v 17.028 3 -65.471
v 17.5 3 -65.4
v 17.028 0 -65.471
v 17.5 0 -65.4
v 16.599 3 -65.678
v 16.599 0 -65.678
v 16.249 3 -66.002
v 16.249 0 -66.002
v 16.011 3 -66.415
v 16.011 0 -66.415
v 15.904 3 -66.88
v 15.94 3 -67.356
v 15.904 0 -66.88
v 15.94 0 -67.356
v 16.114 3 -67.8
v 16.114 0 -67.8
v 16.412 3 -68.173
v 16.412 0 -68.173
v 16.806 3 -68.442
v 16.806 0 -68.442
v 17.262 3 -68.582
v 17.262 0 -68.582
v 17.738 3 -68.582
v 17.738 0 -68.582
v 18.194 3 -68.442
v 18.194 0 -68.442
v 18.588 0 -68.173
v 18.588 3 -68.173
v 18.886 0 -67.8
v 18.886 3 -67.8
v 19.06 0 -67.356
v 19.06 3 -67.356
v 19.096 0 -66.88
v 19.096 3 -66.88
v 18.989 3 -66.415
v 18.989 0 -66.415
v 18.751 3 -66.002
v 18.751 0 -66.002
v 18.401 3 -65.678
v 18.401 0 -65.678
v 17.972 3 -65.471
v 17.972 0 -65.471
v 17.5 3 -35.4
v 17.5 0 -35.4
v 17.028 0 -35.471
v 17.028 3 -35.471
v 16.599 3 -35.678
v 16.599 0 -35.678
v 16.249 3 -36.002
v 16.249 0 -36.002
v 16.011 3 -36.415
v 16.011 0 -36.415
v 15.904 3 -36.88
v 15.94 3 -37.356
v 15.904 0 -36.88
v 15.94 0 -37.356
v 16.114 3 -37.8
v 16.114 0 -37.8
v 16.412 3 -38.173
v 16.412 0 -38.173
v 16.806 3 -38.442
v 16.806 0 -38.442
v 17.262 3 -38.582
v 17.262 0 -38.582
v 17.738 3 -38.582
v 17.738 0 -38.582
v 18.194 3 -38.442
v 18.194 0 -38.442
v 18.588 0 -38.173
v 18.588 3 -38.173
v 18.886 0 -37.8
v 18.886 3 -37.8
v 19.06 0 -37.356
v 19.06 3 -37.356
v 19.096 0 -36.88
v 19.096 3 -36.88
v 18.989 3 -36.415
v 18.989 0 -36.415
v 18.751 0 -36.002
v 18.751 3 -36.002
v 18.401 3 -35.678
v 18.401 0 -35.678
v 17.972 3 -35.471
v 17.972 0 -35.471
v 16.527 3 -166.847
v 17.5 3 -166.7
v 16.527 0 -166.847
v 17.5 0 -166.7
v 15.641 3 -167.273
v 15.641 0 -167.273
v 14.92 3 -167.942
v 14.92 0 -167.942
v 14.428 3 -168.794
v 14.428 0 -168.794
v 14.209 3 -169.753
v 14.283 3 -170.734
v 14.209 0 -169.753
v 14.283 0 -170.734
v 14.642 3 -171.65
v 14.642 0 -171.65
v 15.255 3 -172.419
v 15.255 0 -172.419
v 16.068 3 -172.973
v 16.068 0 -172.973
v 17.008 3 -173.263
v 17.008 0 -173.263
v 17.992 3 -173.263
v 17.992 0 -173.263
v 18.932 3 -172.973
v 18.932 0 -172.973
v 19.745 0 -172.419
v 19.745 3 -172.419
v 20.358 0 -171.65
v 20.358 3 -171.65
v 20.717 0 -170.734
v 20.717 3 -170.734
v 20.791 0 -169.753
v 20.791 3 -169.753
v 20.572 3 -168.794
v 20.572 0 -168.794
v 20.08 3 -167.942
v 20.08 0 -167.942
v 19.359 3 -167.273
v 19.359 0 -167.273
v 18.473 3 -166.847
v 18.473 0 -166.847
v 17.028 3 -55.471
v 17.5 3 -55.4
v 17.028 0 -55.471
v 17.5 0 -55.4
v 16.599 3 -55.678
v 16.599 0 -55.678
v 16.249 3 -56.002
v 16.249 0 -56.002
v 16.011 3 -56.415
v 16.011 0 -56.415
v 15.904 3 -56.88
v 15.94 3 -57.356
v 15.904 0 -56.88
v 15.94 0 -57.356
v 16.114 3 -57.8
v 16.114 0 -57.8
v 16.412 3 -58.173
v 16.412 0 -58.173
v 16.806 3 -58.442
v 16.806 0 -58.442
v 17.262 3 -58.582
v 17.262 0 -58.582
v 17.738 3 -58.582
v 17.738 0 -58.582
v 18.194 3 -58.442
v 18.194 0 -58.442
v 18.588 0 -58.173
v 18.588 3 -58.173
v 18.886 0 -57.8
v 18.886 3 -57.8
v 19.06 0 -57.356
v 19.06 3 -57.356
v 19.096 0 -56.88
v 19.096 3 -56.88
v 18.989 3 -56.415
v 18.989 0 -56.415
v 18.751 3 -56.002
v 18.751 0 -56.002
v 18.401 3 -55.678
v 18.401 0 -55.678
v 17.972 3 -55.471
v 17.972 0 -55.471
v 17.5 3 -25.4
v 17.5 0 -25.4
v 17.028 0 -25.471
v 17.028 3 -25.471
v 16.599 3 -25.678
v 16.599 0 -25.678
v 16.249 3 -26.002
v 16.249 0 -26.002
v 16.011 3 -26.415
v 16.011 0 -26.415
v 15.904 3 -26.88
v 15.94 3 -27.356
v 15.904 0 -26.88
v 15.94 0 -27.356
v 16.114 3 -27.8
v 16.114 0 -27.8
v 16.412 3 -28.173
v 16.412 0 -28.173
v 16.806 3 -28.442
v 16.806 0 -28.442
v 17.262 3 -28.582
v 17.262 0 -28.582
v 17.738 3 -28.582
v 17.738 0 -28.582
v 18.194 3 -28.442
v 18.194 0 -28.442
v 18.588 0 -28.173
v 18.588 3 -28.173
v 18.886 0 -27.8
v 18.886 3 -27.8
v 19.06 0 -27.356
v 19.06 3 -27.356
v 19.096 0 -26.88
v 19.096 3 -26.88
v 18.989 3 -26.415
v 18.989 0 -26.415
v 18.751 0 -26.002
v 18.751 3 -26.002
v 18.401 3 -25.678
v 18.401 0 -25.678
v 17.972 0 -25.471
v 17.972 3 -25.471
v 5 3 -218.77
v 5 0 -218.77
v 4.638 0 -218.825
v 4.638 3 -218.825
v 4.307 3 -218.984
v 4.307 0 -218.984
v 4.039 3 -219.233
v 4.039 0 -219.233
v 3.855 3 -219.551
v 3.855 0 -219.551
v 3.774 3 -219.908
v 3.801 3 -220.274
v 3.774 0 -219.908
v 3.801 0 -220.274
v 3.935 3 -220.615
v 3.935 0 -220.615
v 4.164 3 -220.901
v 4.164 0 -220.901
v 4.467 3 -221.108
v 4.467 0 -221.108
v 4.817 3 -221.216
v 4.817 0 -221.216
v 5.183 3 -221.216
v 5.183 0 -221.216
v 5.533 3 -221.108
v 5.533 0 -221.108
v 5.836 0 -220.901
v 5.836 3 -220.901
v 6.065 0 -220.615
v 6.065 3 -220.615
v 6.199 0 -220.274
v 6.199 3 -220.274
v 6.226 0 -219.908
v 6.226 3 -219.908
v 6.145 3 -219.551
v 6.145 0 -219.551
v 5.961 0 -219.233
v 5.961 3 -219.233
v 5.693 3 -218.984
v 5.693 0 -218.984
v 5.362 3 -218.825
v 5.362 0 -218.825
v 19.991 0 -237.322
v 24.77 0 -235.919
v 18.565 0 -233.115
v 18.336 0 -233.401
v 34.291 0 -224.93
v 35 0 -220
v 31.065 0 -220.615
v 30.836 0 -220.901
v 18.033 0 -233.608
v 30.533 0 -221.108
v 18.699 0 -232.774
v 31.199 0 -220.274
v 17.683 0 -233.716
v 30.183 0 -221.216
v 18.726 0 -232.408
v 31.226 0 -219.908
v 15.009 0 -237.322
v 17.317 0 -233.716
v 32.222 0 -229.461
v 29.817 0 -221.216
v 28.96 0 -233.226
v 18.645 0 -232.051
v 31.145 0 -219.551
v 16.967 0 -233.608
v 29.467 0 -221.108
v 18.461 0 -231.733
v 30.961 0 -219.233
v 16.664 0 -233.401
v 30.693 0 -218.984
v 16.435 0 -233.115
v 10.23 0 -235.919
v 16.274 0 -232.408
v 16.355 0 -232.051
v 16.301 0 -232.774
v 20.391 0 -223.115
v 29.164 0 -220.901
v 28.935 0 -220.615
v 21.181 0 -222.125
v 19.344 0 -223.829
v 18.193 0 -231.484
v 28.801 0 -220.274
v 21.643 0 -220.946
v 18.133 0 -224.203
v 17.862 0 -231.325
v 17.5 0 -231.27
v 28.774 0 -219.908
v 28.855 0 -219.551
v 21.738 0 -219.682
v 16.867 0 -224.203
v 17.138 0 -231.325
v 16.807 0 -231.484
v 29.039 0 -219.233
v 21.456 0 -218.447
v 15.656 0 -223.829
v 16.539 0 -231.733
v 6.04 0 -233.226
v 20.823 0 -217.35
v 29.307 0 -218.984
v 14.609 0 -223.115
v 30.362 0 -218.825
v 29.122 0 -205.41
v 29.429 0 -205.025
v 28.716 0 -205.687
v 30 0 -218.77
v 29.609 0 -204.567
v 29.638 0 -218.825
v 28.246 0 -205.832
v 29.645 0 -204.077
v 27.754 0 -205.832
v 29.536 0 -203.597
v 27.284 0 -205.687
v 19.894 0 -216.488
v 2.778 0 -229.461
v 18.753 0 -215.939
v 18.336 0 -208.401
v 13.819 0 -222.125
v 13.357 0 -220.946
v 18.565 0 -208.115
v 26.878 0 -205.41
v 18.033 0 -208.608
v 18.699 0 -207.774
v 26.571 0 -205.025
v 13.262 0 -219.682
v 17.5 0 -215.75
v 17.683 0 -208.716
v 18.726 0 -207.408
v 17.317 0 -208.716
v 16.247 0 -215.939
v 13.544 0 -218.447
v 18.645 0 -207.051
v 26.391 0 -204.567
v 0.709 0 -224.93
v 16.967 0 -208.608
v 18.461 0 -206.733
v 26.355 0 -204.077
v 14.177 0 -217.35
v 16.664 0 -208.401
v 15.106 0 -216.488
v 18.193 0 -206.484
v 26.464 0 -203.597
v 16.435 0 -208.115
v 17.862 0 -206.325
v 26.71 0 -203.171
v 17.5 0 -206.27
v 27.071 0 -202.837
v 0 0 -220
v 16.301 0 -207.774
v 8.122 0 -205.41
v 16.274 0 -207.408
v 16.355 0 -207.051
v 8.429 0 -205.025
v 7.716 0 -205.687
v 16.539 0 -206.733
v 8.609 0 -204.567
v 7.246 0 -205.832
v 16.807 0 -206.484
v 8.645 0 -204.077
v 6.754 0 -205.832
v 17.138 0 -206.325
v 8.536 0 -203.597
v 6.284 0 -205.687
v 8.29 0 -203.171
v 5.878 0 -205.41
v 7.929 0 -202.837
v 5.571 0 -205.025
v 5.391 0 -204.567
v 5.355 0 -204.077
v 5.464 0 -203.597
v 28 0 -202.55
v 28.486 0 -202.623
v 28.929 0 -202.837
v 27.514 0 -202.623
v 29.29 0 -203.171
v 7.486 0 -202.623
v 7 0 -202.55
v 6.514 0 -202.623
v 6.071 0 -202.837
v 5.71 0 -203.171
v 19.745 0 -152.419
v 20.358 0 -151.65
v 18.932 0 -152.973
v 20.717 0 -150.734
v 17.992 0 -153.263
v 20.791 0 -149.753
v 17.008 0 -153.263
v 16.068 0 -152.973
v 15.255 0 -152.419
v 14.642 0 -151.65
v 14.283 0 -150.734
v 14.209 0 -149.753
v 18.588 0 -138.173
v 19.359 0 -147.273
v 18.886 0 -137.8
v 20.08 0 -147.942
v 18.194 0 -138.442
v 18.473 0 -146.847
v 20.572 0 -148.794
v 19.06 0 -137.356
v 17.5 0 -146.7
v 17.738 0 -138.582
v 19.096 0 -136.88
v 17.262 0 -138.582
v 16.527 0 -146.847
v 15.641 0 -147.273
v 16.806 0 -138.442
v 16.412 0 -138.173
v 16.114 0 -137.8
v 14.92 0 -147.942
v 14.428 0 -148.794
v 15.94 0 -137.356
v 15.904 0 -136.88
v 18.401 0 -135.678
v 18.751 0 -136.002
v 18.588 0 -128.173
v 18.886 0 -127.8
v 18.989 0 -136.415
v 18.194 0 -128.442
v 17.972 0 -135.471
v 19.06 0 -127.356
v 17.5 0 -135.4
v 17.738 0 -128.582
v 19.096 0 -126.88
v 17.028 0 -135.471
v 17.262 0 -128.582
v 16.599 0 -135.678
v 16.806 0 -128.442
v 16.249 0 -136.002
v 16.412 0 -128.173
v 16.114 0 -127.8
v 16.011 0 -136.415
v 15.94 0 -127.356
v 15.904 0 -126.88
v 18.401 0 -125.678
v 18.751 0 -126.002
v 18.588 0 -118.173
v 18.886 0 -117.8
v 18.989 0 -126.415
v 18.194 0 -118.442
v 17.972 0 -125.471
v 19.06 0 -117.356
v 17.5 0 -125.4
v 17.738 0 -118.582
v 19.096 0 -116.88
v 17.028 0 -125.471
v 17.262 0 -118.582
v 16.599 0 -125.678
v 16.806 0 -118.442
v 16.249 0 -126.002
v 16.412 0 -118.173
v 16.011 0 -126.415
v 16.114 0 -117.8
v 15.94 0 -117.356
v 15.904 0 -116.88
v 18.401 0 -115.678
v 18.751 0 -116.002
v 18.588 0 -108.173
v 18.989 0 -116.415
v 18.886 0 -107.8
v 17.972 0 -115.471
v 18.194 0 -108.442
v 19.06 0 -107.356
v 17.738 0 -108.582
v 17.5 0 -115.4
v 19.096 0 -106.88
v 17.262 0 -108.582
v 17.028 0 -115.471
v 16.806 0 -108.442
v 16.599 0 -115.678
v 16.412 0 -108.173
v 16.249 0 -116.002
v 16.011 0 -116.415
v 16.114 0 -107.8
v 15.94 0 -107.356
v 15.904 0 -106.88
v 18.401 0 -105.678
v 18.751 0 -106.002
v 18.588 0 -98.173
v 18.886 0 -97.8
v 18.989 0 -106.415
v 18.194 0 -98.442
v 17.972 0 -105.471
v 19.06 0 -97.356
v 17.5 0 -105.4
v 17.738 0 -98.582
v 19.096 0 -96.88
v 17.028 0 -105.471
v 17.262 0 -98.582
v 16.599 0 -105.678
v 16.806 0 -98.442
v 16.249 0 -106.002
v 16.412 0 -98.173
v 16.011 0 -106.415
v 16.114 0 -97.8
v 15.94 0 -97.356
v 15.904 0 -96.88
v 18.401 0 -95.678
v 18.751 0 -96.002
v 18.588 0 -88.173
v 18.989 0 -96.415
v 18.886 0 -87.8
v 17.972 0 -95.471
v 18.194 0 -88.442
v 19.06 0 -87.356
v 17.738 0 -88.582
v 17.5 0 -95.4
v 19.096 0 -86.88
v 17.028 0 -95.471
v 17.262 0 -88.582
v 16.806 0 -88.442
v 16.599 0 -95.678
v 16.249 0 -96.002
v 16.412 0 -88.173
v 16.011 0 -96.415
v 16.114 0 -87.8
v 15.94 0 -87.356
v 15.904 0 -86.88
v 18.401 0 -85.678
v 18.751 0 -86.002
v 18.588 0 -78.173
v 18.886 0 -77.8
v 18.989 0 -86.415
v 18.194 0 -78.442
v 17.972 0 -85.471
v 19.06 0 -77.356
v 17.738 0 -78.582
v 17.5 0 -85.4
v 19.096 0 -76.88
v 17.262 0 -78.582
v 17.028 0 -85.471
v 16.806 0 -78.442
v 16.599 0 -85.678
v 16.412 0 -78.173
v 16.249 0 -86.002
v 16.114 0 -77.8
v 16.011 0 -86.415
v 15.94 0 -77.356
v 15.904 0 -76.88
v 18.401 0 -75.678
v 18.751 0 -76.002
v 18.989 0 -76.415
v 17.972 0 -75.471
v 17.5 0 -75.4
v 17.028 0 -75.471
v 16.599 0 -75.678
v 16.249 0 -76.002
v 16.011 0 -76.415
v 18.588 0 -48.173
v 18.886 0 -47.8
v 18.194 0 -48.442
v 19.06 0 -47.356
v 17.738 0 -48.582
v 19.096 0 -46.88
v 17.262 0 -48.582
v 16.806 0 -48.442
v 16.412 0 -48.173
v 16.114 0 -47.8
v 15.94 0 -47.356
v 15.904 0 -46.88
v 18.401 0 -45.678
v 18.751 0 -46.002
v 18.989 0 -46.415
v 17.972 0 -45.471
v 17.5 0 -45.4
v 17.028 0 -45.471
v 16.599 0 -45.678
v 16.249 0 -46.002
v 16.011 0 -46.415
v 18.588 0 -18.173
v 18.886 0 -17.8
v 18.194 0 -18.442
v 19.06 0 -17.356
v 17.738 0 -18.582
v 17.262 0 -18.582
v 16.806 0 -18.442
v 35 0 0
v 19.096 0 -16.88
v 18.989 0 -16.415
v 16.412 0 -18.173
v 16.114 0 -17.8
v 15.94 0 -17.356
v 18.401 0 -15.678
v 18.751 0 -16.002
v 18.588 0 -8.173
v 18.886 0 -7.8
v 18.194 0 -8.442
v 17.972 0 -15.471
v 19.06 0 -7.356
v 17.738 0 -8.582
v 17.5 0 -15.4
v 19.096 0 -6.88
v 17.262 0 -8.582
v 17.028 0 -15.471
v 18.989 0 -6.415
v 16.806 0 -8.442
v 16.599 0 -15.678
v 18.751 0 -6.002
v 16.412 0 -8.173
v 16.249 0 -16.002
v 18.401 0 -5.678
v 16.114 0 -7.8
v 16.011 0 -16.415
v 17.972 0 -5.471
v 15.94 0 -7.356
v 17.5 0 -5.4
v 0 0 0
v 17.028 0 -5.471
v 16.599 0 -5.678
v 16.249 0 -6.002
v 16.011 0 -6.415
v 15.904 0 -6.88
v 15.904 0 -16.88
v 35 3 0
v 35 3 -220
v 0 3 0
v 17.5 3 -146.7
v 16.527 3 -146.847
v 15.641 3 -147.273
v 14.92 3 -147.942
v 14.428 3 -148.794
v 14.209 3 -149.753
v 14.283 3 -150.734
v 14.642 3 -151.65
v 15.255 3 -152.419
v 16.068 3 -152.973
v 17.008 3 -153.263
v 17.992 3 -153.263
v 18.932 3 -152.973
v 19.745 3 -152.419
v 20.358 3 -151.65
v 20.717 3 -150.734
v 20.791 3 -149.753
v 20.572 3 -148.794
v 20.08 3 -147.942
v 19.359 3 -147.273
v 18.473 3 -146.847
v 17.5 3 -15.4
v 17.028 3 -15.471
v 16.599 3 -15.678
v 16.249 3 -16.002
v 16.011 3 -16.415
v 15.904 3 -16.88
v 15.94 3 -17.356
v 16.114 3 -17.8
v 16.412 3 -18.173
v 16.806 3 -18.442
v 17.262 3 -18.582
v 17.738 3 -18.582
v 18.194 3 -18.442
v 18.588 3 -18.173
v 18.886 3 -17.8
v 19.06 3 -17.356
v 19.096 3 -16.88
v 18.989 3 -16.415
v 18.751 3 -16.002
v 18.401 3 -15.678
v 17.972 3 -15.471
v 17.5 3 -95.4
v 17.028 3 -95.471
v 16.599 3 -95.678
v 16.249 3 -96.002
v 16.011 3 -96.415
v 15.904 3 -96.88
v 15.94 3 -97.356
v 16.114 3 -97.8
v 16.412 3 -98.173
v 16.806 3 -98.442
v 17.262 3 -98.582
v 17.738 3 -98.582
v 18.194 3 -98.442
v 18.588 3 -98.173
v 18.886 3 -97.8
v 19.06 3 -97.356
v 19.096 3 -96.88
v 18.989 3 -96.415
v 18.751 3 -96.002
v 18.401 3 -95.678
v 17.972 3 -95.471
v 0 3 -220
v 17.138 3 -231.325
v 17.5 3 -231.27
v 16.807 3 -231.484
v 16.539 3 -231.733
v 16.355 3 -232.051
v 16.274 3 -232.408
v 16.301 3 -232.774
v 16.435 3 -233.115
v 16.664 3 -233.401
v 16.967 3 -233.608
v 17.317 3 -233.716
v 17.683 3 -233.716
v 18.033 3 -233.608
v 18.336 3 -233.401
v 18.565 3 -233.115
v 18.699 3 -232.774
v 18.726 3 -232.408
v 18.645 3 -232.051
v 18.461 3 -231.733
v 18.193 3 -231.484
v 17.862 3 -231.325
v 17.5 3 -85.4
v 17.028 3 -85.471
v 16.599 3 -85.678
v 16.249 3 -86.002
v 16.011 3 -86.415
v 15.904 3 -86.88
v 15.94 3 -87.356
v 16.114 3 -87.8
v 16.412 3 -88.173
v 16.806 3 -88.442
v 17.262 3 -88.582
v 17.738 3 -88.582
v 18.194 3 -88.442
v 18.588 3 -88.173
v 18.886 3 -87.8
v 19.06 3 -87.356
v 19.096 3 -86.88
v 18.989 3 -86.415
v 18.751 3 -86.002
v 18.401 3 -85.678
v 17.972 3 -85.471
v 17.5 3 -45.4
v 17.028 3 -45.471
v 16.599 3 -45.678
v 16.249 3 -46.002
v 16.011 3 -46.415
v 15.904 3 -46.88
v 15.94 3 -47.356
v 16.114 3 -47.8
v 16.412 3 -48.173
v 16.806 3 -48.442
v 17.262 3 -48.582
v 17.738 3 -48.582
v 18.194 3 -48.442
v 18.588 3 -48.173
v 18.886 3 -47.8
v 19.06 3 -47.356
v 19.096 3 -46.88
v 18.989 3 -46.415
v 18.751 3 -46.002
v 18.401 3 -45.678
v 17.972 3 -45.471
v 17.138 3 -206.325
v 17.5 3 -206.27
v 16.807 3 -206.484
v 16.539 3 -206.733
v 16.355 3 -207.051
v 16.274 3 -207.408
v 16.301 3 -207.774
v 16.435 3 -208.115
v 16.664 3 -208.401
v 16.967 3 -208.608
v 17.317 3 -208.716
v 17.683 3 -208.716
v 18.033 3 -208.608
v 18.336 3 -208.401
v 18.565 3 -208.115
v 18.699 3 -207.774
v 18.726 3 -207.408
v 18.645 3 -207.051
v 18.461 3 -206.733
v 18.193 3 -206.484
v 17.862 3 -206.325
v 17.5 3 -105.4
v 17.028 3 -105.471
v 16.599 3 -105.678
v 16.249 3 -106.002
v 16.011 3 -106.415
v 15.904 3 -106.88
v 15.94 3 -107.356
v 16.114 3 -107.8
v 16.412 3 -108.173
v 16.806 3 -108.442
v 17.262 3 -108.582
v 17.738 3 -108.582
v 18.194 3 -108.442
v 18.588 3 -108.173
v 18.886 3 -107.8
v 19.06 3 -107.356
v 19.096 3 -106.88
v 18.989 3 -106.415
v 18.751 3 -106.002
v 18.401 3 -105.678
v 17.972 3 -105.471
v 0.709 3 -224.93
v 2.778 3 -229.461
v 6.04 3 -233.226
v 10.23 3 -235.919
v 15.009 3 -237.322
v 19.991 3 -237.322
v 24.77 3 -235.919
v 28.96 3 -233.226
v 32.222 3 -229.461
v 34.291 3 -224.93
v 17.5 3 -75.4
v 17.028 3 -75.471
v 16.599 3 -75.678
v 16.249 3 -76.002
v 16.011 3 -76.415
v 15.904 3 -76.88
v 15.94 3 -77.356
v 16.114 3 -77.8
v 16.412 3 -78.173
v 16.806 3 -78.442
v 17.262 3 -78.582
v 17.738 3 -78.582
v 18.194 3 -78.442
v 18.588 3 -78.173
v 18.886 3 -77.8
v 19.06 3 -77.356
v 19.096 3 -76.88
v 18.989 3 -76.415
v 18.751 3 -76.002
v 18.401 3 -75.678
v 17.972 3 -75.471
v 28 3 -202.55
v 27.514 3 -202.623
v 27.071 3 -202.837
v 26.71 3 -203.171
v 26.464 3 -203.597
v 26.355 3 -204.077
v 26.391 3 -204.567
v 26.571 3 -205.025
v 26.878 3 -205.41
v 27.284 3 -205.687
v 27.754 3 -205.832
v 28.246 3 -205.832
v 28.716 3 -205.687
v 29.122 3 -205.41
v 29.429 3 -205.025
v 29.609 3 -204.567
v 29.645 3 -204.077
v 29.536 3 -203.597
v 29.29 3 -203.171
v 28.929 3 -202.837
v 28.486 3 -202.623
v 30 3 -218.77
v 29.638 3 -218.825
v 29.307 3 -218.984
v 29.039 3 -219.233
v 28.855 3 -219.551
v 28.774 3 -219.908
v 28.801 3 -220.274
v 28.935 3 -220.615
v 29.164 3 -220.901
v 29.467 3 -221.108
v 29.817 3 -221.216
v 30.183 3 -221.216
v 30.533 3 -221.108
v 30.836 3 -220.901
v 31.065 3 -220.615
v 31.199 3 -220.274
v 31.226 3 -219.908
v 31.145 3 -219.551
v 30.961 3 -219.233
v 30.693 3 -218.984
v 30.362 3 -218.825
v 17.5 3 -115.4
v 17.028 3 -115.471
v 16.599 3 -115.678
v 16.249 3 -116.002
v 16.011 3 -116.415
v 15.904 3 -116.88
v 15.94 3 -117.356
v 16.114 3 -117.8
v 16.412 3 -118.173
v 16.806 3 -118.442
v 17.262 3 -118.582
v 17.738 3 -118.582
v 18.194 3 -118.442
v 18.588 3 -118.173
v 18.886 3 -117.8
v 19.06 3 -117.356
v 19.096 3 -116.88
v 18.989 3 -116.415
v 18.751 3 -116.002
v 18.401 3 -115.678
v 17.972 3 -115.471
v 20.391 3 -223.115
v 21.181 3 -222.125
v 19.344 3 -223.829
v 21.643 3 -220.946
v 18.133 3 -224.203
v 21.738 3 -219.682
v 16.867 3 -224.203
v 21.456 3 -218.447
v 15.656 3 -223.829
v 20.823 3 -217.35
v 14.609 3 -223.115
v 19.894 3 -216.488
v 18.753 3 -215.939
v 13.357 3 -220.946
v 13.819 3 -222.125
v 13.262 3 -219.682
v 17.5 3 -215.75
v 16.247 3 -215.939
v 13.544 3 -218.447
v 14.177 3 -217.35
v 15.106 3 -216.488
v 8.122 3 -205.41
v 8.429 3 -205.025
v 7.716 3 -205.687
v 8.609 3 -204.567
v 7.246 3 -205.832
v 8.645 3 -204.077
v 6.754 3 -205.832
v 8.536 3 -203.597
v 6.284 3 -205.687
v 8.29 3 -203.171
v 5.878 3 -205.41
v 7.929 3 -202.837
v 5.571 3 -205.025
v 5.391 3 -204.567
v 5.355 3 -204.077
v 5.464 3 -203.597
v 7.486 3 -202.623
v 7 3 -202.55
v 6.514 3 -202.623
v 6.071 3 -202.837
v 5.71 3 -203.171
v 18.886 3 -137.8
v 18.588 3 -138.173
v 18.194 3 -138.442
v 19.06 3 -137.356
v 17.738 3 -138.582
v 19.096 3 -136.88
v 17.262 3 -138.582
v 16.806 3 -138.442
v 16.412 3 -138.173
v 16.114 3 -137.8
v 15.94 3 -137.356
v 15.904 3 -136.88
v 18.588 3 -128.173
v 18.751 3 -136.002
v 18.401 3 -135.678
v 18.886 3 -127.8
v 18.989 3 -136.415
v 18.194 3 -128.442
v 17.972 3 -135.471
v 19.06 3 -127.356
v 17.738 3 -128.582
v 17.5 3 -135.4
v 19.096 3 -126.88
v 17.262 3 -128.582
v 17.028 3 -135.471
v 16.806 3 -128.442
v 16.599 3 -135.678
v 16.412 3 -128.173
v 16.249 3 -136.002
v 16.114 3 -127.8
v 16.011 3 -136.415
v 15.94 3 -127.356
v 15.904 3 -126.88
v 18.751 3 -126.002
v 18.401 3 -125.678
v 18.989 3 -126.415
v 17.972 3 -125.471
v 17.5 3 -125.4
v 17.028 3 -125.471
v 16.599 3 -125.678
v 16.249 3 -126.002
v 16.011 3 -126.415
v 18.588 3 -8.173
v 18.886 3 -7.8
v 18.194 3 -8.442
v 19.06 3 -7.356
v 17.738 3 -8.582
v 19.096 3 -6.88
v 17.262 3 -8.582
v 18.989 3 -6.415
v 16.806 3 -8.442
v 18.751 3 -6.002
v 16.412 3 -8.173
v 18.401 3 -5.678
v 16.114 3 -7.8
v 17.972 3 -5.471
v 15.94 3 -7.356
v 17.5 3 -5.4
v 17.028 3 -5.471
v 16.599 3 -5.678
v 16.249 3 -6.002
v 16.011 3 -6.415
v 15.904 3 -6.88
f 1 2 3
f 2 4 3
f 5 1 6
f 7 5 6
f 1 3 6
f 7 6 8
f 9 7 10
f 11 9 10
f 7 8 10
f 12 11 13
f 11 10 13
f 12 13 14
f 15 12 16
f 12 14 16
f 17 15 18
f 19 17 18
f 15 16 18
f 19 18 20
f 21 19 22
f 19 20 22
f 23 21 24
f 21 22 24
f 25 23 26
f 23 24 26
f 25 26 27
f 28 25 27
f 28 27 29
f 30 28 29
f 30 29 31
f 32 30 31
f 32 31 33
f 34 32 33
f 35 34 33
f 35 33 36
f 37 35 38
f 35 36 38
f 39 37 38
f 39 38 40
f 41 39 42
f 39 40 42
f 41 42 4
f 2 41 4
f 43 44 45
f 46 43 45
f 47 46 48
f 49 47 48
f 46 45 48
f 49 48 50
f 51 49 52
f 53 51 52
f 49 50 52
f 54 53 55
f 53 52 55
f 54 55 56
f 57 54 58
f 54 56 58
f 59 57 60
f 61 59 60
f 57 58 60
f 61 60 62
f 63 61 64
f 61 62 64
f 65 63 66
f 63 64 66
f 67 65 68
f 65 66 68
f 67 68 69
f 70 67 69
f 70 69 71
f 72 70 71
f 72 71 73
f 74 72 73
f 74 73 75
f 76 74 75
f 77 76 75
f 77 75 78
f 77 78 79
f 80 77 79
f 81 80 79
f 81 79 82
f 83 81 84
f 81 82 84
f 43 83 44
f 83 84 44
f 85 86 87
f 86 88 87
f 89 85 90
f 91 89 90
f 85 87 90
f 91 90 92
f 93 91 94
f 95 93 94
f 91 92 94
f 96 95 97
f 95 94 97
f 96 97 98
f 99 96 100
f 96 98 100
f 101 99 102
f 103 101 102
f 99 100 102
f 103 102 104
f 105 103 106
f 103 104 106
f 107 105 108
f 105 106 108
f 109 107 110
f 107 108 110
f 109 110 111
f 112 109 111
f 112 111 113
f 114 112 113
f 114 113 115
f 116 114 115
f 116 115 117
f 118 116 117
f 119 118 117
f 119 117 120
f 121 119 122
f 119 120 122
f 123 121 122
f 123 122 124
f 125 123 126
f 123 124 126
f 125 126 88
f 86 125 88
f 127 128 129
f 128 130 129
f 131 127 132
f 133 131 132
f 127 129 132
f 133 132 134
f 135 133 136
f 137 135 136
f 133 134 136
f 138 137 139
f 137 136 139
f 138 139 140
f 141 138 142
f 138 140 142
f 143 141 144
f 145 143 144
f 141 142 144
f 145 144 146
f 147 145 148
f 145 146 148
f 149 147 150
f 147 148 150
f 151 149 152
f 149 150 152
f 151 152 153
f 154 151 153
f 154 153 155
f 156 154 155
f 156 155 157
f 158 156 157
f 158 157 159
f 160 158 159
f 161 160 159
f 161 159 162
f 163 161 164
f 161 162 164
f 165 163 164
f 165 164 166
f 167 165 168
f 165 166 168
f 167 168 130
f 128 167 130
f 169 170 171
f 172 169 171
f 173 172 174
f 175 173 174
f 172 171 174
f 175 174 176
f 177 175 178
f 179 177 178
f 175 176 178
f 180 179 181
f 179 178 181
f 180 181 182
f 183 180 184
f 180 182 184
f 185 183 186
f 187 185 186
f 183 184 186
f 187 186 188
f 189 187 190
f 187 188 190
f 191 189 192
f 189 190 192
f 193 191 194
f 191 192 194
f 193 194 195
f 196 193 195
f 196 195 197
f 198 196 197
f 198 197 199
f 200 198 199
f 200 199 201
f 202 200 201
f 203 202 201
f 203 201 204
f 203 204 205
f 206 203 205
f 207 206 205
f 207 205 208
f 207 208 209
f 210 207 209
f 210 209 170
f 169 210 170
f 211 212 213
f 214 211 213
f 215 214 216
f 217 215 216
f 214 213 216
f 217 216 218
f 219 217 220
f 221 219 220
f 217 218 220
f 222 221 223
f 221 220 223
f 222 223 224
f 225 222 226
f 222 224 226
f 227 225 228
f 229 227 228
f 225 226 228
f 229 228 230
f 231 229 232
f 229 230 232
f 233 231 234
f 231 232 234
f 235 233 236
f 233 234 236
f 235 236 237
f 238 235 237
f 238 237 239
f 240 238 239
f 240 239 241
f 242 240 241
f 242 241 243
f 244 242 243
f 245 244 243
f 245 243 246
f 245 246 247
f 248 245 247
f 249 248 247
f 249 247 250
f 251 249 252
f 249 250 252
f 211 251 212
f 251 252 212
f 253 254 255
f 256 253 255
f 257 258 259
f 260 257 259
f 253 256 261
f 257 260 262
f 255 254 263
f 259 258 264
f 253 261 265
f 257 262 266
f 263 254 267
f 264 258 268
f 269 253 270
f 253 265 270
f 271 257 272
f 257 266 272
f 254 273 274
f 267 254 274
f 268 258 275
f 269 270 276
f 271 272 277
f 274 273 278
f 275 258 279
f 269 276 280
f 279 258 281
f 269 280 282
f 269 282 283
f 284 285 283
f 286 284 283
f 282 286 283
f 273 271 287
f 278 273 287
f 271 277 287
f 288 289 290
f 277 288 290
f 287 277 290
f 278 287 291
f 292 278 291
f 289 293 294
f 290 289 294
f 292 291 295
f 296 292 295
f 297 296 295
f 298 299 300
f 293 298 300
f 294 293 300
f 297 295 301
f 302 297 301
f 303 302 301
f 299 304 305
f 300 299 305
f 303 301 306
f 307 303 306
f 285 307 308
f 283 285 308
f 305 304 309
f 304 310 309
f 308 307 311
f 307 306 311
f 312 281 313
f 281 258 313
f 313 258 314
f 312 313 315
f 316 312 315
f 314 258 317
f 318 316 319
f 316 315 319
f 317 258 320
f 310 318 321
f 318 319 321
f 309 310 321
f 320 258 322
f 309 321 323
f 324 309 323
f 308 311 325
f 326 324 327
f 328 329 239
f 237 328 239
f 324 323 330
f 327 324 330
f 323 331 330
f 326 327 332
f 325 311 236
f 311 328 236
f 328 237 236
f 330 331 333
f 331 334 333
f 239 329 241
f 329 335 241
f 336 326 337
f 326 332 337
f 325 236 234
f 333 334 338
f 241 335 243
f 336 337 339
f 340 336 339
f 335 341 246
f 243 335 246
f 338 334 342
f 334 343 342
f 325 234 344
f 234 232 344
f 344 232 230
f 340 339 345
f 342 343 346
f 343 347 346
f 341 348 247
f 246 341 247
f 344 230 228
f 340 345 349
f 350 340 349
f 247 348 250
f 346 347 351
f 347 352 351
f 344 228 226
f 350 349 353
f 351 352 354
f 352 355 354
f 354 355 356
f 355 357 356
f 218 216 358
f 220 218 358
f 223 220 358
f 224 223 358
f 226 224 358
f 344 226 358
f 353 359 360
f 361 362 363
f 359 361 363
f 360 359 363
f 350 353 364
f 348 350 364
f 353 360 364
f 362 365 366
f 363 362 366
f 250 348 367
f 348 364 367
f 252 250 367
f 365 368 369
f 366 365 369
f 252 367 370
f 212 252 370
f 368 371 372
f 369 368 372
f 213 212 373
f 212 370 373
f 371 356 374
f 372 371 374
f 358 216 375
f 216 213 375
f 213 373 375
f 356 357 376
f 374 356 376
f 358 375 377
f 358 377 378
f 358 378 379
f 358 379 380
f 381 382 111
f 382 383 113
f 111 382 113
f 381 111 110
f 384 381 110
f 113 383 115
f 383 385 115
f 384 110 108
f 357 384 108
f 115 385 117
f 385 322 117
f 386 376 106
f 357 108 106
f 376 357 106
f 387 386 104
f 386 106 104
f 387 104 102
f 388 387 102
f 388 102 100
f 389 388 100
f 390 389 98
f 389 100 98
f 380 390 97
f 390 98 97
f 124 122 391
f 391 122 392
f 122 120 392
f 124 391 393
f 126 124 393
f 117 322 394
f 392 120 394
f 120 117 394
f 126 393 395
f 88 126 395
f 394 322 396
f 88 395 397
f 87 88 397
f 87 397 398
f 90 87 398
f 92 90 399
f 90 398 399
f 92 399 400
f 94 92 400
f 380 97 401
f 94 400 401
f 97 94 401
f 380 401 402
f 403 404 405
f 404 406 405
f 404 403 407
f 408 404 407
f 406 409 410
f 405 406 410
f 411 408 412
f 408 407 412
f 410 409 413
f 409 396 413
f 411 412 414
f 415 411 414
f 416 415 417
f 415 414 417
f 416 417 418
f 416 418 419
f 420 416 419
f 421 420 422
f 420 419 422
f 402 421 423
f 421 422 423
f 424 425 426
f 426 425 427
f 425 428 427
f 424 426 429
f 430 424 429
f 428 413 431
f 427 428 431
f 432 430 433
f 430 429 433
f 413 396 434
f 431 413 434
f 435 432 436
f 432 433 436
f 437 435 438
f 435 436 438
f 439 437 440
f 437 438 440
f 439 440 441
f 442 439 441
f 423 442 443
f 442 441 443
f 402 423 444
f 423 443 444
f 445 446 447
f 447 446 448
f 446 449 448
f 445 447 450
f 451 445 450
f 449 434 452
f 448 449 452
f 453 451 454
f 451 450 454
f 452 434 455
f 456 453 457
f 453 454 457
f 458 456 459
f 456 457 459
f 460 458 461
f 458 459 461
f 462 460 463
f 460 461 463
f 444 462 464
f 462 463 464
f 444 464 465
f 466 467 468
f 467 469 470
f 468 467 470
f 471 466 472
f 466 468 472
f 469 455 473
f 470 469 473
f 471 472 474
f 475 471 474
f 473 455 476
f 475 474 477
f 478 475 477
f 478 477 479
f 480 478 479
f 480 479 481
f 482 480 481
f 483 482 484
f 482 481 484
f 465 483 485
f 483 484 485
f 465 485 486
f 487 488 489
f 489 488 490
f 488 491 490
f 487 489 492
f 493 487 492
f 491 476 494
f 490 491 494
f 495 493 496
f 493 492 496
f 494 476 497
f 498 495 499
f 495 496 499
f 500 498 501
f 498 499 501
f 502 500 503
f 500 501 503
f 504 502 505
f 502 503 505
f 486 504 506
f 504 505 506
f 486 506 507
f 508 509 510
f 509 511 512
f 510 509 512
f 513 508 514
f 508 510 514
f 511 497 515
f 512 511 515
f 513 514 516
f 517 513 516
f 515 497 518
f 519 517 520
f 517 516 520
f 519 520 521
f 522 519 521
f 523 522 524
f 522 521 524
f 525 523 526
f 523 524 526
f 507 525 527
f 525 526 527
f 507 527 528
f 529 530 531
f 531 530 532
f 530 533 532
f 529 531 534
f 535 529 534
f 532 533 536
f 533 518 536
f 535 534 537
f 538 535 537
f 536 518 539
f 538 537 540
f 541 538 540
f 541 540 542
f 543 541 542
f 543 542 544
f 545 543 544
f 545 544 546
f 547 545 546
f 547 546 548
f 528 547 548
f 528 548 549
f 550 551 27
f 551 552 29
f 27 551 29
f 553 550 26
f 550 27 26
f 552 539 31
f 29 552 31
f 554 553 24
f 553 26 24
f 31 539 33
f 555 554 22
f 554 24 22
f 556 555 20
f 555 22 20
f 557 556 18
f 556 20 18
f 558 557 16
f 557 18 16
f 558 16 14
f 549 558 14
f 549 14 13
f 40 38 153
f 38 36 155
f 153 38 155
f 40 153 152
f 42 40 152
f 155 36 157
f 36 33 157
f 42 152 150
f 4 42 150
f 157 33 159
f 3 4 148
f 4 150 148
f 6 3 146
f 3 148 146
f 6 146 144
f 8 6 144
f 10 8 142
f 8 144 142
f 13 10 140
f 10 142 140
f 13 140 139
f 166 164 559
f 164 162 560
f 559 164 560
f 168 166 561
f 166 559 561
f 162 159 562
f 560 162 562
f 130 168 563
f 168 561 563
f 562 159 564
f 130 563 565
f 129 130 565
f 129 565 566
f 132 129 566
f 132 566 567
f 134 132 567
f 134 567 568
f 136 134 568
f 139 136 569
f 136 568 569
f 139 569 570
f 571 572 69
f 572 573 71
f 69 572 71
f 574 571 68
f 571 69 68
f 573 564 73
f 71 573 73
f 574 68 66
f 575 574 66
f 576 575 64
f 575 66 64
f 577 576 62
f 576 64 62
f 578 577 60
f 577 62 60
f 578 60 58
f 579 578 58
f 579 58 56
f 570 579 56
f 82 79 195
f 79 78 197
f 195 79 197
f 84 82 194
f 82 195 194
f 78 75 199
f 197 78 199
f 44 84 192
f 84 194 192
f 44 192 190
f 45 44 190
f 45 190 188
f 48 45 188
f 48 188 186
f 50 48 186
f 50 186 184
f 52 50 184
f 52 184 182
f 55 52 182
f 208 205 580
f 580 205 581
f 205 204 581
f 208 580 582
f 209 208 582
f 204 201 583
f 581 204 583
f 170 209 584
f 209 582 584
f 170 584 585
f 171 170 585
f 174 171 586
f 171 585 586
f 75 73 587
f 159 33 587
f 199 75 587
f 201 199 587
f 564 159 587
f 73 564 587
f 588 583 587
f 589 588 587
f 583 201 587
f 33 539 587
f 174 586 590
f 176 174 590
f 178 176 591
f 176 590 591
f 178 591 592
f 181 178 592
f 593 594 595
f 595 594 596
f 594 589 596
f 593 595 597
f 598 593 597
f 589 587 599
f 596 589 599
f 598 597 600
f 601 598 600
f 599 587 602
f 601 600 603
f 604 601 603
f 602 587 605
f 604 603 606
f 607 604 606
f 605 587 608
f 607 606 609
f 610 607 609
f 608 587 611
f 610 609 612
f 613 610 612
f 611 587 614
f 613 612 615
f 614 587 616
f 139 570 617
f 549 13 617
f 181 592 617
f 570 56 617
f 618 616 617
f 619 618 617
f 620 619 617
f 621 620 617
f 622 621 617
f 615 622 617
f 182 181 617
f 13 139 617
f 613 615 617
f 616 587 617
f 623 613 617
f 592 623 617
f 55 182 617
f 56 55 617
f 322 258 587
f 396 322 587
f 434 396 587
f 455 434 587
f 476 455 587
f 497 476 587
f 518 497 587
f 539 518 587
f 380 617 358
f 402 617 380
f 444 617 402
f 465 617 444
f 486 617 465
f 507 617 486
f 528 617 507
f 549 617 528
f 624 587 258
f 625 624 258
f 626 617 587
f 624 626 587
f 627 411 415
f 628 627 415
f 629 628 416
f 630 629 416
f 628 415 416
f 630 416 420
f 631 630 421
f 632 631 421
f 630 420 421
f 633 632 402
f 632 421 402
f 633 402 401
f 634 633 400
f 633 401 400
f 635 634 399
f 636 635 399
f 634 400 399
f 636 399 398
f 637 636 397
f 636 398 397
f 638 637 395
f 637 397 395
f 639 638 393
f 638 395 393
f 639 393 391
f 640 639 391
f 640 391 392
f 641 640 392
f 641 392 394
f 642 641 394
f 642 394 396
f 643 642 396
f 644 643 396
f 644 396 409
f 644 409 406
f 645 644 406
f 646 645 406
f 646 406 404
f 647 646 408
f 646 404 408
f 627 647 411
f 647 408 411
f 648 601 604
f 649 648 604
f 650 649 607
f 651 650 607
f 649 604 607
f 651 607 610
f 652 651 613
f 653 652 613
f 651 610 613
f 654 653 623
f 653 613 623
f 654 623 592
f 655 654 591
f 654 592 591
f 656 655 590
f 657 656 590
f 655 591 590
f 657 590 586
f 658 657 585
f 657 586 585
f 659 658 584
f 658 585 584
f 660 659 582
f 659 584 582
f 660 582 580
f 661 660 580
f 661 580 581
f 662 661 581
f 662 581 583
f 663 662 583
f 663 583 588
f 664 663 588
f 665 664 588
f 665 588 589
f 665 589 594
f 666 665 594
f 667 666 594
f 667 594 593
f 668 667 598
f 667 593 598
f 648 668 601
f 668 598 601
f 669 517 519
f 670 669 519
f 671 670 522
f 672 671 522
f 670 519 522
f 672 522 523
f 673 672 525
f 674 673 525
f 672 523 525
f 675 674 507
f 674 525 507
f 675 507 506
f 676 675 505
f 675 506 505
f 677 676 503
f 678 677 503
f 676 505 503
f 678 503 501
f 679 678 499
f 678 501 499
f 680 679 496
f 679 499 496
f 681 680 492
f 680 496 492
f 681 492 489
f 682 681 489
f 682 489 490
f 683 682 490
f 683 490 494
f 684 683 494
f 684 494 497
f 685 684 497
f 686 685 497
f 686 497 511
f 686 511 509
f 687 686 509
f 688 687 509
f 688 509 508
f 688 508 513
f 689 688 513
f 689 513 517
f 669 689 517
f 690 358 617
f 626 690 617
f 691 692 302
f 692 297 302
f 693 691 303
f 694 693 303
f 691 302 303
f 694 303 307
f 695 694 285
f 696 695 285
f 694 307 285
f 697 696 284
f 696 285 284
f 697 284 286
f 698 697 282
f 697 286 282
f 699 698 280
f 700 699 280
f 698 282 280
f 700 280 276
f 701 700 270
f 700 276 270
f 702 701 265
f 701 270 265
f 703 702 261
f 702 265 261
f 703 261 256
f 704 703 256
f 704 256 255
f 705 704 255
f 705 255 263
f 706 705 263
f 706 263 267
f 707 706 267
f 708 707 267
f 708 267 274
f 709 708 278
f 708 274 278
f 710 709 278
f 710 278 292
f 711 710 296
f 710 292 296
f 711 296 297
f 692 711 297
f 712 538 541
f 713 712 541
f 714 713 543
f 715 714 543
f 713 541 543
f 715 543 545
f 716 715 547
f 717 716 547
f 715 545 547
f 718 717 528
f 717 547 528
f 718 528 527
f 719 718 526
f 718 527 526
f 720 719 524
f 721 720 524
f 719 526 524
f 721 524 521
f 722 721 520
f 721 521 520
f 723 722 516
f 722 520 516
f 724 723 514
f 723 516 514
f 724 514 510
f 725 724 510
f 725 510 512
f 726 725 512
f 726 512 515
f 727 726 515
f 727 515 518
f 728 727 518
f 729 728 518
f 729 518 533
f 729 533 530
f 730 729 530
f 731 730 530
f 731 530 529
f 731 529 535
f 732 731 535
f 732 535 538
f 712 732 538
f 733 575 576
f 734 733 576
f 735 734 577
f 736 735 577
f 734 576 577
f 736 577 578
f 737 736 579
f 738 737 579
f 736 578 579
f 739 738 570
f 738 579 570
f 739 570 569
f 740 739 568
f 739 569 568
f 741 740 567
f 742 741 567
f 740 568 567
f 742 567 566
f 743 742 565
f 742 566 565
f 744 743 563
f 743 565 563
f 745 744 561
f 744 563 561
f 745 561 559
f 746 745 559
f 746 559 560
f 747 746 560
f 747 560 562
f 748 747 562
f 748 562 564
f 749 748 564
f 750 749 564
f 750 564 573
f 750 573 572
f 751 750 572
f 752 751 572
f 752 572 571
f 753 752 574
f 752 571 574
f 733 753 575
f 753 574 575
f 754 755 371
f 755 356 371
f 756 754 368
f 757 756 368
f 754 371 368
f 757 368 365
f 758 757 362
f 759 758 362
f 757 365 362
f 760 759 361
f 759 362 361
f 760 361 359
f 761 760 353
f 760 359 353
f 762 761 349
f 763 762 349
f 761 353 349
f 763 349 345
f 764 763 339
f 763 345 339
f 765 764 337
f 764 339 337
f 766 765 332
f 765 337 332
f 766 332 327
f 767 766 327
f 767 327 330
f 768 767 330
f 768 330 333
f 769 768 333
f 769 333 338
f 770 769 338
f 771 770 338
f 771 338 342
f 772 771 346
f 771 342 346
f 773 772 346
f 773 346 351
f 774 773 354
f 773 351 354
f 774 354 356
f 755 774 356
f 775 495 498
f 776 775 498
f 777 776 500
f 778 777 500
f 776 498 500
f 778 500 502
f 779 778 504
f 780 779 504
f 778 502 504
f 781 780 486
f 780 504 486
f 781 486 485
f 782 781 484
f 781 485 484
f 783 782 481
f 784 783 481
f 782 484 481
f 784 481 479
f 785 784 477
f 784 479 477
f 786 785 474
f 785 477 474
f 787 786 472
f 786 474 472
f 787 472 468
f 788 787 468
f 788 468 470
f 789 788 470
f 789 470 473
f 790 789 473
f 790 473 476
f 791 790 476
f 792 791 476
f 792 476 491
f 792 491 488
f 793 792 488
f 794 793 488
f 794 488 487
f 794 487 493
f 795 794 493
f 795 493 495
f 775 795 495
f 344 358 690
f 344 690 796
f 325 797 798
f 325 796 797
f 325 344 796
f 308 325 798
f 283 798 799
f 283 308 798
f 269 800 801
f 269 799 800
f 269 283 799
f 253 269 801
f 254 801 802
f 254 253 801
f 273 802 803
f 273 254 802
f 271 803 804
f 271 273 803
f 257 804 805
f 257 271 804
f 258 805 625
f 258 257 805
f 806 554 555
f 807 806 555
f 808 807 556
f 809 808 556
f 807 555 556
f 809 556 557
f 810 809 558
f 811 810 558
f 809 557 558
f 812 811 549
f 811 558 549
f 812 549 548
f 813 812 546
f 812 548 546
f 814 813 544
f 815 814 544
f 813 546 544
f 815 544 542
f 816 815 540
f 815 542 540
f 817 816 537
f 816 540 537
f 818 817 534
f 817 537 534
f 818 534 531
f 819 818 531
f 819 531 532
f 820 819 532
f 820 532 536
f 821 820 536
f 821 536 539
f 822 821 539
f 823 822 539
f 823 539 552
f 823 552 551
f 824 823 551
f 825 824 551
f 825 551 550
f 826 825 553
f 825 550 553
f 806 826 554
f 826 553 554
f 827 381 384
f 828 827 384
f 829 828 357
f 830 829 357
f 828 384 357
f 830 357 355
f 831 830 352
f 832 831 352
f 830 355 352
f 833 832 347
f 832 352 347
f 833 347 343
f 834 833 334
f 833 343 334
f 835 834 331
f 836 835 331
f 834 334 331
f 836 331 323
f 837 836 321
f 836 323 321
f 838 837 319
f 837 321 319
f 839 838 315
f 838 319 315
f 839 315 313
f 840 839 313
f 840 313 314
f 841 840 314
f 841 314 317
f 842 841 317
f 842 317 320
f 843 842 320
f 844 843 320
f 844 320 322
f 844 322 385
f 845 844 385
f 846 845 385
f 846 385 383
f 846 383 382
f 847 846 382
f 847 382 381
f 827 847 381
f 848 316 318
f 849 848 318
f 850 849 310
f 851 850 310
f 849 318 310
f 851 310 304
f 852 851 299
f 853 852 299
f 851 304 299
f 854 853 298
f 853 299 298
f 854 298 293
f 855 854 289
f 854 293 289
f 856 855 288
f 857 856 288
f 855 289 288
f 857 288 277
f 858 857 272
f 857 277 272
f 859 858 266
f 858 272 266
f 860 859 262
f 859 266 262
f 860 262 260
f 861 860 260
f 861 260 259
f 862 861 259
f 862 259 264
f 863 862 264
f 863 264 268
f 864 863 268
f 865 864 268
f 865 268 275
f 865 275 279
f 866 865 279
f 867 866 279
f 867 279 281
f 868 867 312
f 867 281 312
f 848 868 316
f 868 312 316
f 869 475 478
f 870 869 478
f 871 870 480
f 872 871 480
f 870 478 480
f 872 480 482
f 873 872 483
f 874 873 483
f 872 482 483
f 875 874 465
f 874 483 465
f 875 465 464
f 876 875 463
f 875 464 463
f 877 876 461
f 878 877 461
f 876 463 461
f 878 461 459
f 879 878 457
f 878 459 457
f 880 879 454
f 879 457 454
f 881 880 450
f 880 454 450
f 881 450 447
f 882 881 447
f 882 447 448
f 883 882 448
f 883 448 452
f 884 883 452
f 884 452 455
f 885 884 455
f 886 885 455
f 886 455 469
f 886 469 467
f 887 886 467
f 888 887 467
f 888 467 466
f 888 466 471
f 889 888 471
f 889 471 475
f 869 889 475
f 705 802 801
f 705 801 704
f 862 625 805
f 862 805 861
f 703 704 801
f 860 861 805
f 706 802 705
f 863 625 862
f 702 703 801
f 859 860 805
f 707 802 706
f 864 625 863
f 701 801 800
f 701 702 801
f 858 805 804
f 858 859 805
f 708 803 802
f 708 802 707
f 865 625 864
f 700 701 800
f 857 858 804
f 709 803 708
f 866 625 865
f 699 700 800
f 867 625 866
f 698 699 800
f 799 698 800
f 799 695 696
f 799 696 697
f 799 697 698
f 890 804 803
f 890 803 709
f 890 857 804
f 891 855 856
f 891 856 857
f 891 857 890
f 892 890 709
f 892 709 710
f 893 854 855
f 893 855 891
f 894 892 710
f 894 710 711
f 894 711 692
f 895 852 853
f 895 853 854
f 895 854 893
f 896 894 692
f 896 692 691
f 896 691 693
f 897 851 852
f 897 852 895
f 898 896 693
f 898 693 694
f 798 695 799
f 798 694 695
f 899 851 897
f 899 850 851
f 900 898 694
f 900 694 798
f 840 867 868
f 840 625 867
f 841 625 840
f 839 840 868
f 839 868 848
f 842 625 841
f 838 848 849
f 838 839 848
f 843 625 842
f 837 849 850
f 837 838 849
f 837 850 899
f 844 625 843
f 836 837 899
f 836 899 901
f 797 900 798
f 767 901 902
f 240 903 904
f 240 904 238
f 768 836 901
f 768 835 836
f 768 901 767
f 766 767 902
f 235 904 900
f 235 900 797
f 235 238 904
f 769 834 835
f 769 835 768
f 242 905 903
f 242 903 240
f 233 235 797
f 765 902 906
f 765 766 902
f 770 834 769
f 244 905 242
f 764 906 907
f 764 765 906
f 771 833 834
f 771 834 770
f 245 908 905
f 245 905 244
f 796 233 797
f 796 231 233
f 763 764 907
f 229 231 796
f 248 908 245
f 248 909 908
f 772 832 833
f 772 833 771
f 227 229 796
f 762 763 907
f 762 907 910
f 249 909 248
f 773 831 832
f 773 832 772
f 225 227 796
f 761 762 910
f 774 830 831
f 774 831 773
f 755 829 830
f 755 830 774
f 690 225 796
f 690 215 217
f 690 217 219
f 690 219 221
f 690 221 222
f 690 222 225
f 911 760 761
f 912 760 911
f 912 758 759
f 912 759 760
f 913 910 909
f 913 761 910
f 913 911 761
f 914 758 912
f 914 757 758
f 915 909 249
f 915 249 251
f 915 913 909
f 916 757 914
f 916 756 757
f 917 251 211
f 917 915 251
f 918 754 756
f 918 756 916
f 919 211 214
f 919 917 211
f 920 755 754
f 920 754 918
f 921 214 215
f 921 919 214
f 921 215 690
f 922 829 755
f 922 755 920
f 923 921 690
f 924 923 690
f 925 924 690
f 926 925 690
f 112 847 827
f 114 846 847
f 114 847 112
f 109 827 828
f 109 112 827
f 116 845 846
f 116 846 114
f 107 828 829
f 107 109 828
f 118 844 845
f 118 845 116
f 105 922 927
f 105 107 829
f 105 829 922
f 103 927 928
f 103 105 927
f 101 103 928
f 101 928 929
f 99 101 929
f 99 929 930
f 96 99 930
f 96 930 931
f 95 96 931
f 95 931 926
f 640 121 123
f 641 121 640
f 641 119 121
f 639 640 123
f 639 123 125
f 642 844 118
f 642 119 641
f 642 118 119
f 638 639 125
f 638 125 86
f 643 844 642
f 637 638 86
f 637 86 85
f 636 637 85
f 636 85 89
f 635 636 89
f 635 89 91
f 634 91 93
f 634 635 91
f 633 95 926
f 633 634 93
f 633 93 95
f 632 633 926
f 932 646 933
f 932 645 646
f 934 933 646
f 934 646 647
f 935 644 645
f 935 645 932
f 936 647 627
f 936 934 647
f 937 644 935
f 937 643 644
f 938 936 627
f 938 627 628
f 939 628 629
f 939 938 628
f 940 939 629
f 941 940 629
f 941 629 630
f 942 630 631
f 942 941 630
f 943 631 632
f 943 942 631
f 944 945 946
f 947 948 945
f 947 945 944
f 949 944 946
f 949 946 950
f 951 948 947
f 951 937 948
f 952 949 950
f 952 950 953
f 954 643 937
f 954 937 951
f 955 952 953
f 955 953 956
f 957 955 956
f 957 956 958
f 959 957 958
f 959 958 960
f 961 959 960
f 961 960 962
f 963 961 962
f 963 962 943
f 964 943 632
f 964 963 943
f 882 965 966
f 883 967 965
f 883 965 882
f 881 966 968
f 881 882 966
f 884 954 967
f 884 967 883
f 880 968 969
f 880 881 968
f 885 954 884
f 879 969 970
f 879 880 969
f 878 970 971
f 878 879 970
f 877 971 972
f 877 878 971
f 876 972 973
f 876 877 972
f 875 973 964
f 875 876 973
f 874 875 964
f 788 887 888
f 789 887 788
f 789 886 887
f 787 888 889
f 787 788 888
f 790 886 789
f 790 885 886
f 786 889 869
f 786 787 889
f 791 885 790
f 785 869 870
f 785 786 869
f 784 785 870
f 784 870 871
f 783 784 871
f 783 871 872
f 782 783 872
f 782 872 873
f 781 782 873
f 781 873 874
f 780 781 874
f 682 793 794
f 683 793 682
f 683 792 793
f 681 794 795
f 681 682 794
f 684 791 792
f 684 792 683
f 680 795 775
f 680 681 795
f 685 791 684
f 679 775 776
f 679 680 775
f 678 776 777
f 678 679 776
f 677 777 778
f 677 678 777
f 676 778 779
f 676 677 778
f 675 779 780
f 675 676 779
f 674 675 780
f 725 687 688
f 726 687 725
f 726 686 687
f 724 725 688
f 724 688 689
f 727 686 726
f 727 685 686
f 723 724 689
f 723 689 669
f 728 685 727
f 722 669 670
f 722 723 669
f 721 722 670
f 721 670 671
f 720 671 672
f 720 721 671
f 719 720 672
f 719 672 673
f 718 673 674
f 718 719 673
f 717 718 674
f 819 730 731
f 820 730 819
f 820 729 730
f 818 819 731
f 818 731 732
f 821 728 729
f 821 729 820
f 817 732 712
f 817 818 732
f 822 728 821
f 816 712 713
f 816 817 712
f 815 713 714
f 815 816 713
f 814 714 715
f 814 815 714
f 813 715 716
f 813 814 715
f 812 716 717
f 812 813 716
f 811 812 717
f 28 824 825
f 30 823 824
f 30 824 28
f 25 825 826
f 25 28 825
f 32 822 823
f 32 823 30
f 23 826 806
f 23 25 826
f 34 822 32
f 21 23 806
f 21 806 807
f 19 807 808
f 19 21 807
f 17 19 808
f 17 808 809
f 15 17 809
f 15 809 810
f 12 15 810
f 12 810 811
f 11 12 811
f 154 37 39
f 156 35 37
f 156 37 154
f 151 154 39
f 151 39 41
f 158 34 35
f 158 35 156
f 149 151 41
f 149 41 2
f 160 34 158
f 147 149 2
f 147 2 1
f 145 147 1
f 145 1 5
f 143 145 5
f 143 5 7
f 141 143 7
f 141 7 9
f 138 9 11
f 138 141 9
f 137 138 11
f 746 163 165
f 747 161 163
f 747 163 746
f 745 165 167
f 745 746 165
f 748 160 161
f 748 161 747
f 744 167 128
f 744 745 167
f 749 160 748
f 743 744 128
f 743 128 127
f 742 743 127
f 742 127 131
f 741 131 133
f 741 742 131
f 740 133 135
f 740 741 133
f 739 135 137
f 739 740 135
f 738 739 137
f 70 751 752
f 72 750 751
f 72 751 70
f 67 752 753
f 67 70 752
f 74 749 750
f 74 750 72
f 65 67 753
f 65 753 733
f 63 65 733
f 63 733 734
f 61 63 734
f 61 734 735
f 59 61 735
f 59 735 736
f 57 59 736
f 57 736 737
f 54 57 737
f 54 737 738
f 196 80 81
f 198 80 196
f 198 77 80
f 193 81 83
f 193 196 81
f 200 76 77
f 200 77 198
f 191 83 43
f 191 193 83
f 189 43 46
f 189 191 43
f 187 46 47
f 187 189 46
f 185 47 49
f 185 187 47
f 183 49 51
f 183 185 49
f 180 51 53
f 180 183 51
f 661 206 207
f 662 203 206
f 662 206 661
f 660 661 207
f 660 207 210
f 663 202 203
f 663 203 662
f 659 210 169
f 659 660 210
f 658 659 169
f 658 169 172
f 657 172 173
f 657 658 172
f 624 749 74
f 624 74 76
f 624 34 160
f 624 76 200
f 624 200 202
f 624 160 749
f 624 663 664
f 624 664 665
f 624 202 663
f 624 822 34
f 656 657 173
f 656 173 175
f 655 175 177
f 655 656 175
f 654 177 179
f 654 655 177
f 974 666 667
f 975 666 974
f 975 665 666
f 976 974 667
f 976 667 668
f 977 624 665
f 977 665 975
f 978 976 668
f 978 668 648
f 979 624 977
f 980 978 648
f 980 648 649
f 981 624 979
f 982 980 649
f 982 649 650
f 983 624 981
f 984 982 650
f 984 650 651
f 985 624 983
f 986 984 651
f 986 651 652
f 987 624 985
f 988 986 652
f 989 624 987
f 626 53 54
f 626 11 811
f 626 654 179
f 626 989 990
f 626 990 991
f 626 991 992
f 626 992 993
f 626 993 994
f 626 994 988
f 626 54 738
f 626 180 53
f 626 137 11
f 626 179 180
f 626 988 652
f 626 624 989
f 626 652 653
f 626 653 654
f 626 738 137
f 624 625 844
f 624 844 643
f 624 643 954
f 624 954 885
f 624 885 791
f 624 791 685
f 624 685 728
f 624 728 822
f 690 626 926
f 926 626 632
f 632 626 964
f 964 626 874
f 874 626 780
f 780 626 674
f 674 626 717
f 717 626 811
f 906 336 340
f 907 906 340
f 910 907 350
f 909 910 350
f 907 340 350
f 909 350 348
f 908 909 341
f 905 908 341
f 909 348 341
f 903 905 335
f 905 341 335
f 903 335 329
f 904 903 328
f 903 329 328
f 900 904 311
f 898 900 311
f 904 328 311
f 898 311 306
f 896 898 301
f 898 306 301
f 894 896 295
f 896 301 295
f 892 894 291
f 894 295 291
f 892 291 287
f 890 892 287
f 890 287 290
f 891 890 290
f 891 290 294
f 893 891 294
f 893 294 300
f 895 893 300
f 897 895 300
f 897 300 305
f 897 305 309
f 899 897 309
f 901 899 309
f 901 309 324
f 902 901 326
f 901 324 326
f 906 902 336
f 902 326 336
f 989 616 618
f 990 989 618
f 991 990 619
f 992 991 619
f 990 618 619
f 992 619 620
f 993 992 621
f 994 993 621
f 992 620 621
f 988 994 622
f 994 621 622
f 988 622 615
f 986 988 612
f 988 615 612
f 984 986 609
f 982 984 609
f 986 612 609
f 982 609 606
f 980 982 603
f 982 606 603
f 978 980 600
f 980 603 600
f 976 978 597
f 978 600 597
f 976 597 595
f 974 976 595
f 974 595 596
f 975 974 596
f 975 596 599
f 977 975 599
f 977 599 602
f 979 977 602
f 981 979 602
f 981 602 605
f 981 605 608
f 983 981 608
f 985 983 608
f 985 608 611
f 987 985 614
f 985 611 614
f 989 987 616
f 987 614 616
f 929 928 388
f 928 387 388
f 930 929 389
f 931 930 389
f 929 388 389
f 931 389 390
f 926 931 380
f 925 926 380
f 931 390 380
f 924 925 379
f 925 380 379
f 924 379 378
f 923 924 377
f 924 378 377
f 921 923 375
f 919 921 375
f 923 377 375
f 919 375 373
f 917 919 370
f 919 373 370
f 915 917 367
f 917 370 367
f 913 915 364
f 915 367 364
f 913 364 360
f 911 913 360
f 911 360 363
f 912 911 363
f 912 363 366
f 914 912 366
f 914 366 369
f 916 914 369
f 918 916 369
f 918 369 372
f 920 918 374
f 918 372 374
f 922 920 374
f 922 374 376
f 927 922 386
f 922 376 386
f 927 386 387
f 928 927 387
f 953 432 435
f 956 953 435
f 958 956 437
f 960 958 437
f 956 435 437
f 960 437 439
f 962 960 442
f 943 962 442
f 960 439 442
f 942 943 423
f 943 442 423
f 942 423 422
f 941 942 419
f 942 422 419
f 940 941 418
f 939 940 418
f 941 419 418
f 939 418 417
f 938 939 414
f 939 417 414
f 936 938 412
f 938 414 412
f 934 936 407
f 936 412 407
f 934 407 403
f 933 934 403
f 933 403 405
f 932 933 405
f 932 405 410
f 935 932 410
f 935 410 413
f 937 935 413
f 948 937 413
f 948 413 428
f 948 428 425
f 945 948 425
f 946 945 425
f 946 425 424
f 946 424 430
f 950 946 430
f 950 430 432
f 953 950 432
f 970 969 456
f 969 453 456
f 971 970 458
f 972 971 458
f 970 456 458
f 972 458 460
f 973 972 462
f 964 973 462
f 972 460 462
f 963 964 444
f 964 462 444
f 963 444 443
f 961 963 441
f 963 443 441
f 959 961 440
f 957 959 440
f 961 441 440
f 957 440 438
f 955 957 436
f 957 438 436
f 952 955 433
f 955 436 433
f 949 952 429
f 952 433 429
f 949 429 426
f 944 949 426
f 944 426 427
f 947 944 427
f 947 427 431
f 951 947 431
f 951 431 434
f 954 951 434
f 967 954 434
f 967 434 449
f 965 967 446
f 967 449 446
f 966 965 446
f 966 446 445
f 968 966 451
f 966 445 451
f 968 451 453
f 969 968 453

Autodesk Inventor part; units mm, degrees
ref_plane "YZ Plane" through (0, 0, 0) normal (1, 0, 0) x (0, 1, 0)
ref_plane "XZ Plane" through (0, 0, 0) normal (0, 1, 0) x (-1, 0, 0)
ref_plane "XY Plane" through (0, 0, 0) normal (0, 0, 1) x (1, 0, 0)
sketch "スケッチ1" plane through (0, 0, 0) normal (0, 1, 0) x (-1, 0, 0)
  line L0 (0, 0) -> (-35, 0)
  line L1 (-35, 0) -> (-35, -220)
  line L2 (-35, -220) -> (0, -220)
  line L3 (0, -220) -> (0, 0)
  arc A0 (-35, -220) -> (0, -220) centre (-17.5, -220) ccw
  dimension "d0" = 35
  dimension "d1" = 220
  dimension "d2" = 17.5
extrude "押し出し1" add sketch "スケッチ1" along normal blind 3
sketch "スケッチ2" plane through (0, 3, 0) normal (0, 1, 0) x (1, 0, 0)
  line L0 (0, 0) -> (35, 0) construction
  line L1 (17.5, 0) -> (17.5, 237.5) construction
  arc A0 (35, 220) -> (0, 220) centre (17.5, 220) ccw construction
hole "穴1" at (17.5, 3, -220) direction (0, -1, 0) diameter 8.5 end through all
sketch "スケッチ3" plane through (0, 3, 0) normal (0, 1, 0) x (1, 0, 0)
  circle A0 centre (17.5, 220) radius 4.25 projected
  circle A1 centre (17.5, 220) radius 12.5
  point P0 (0, 0)
  point P1 (5, 220)
  point P2 (30, 220)
  point P3 (17.5, 232.5)
  point P4 (17.5, 207.5)
  dimension "d12" = 25
hole "穴2" at (5, 3, -220) at (30, 3, -220) at (17.5, 3, -232.5) at (17.5, 3, -207.5) direction (0, -1, 0) diameter 2.459 end through all thread size "M3x0.5" class "6H" standard "ISO Metric profile"
sketch "スケッチ4" plane through (0, 3, 0) normal (0, 1, 0) x (1, 0, 0)
  line L0 (0, 0) -> (35, 0) construction
  line L1 (17.5, 0) -> (17.5, 237.5) construction
  arc A0 (35, 220) -> (0, 220) centre (17.5, 220) ccw construction
  circle A1 centre (17.5, 220) radius 4.25 projected
  point P0 (17.5, 137)
  point P1 (17.5, 127)
  point P2 (17.5, 117)
  point P3 (17.5, 107)
  point P4 (17.5, 97)
  point P5 (17.5, 87)
  point P6 (17.5, 77)
  point P7 (17.5, 67)
  point P8 (17.5, 57)
  point P9 (17.5, 47)
  point P10 (17.5, 37)
  point P11 (17.5, 27)
  point P12 (17.5, 17)
  point P13 (17.5, 7)
  dimension "d42" = 83
  dimension "d45" = 10
hole "穴3" at (17.5, 3, -137) at (17.5, 3, -127) at (17.5, 3, -117) at (17.5, 3, -107) at (17.5, 3, -97) at (17.5, 3, -87) at (17.5, 3, -77) at (17.5, 3, -67) at (17.5, 3, -57) at (17.5, 3, -47) at (17.5, 3, -37) at (17.5, 3, -27) at (17.5, 3, -17) at (17.5, 3, -7) direction (0, -1, 0) diameter 3.2 end through all
sketch "スケッチ5" plane through (0, 3, 0) normal (0, 1, 0) x (1, 0, 0)
  line L0 (0, 0) -> (35, 0) construction
  line L1 (17.5, 0) -> (17.5, 237.5) construction
  arc A0 (35, 220) -> (0, 220) centre (17.5, 220) ccw construction
  circle A1 centre (17.5, 137) radius 1.6 construction
  point P0 (17.5, 150)
  point P1 (17.5, 170)
  dimension "d50" = 13
  dimension "d51" = 20
hole "穴4" at (17.5, 3, -150) at (17.5, 3, -170) direction (0, -1, 0) diameter 6.6 end through all
sketch "スケッチ6" plane through (0, 3, 0) normal (0, 1, 0) x (1, 0, 0)
  line L0 (35, 0) -> (35, 220) projected
  line L1 (35, 204.2) -> (0, 204.2) construction
  line L2 (0, 220) -> (0, 0) projected
  circle A0 centre (17.5, 220) radius 4.25 projected
  line L3 (17.5, 220) -> (17.5, 204.2) construction
  point P0 (28, 204.2)
  point P1 (7, 204.2)
  dimension "d52" = 15.8
  dimension "d53" = 10.5
  dimension "d54" = 10.5
hole "穴5" at (28, 3, -204.2) at (7, 3, -204.2) direction (0, -1, 0) diameter 3.3 end through all
properties part number "shoulder2_upper_plate" material "アルミニウム 5052"
